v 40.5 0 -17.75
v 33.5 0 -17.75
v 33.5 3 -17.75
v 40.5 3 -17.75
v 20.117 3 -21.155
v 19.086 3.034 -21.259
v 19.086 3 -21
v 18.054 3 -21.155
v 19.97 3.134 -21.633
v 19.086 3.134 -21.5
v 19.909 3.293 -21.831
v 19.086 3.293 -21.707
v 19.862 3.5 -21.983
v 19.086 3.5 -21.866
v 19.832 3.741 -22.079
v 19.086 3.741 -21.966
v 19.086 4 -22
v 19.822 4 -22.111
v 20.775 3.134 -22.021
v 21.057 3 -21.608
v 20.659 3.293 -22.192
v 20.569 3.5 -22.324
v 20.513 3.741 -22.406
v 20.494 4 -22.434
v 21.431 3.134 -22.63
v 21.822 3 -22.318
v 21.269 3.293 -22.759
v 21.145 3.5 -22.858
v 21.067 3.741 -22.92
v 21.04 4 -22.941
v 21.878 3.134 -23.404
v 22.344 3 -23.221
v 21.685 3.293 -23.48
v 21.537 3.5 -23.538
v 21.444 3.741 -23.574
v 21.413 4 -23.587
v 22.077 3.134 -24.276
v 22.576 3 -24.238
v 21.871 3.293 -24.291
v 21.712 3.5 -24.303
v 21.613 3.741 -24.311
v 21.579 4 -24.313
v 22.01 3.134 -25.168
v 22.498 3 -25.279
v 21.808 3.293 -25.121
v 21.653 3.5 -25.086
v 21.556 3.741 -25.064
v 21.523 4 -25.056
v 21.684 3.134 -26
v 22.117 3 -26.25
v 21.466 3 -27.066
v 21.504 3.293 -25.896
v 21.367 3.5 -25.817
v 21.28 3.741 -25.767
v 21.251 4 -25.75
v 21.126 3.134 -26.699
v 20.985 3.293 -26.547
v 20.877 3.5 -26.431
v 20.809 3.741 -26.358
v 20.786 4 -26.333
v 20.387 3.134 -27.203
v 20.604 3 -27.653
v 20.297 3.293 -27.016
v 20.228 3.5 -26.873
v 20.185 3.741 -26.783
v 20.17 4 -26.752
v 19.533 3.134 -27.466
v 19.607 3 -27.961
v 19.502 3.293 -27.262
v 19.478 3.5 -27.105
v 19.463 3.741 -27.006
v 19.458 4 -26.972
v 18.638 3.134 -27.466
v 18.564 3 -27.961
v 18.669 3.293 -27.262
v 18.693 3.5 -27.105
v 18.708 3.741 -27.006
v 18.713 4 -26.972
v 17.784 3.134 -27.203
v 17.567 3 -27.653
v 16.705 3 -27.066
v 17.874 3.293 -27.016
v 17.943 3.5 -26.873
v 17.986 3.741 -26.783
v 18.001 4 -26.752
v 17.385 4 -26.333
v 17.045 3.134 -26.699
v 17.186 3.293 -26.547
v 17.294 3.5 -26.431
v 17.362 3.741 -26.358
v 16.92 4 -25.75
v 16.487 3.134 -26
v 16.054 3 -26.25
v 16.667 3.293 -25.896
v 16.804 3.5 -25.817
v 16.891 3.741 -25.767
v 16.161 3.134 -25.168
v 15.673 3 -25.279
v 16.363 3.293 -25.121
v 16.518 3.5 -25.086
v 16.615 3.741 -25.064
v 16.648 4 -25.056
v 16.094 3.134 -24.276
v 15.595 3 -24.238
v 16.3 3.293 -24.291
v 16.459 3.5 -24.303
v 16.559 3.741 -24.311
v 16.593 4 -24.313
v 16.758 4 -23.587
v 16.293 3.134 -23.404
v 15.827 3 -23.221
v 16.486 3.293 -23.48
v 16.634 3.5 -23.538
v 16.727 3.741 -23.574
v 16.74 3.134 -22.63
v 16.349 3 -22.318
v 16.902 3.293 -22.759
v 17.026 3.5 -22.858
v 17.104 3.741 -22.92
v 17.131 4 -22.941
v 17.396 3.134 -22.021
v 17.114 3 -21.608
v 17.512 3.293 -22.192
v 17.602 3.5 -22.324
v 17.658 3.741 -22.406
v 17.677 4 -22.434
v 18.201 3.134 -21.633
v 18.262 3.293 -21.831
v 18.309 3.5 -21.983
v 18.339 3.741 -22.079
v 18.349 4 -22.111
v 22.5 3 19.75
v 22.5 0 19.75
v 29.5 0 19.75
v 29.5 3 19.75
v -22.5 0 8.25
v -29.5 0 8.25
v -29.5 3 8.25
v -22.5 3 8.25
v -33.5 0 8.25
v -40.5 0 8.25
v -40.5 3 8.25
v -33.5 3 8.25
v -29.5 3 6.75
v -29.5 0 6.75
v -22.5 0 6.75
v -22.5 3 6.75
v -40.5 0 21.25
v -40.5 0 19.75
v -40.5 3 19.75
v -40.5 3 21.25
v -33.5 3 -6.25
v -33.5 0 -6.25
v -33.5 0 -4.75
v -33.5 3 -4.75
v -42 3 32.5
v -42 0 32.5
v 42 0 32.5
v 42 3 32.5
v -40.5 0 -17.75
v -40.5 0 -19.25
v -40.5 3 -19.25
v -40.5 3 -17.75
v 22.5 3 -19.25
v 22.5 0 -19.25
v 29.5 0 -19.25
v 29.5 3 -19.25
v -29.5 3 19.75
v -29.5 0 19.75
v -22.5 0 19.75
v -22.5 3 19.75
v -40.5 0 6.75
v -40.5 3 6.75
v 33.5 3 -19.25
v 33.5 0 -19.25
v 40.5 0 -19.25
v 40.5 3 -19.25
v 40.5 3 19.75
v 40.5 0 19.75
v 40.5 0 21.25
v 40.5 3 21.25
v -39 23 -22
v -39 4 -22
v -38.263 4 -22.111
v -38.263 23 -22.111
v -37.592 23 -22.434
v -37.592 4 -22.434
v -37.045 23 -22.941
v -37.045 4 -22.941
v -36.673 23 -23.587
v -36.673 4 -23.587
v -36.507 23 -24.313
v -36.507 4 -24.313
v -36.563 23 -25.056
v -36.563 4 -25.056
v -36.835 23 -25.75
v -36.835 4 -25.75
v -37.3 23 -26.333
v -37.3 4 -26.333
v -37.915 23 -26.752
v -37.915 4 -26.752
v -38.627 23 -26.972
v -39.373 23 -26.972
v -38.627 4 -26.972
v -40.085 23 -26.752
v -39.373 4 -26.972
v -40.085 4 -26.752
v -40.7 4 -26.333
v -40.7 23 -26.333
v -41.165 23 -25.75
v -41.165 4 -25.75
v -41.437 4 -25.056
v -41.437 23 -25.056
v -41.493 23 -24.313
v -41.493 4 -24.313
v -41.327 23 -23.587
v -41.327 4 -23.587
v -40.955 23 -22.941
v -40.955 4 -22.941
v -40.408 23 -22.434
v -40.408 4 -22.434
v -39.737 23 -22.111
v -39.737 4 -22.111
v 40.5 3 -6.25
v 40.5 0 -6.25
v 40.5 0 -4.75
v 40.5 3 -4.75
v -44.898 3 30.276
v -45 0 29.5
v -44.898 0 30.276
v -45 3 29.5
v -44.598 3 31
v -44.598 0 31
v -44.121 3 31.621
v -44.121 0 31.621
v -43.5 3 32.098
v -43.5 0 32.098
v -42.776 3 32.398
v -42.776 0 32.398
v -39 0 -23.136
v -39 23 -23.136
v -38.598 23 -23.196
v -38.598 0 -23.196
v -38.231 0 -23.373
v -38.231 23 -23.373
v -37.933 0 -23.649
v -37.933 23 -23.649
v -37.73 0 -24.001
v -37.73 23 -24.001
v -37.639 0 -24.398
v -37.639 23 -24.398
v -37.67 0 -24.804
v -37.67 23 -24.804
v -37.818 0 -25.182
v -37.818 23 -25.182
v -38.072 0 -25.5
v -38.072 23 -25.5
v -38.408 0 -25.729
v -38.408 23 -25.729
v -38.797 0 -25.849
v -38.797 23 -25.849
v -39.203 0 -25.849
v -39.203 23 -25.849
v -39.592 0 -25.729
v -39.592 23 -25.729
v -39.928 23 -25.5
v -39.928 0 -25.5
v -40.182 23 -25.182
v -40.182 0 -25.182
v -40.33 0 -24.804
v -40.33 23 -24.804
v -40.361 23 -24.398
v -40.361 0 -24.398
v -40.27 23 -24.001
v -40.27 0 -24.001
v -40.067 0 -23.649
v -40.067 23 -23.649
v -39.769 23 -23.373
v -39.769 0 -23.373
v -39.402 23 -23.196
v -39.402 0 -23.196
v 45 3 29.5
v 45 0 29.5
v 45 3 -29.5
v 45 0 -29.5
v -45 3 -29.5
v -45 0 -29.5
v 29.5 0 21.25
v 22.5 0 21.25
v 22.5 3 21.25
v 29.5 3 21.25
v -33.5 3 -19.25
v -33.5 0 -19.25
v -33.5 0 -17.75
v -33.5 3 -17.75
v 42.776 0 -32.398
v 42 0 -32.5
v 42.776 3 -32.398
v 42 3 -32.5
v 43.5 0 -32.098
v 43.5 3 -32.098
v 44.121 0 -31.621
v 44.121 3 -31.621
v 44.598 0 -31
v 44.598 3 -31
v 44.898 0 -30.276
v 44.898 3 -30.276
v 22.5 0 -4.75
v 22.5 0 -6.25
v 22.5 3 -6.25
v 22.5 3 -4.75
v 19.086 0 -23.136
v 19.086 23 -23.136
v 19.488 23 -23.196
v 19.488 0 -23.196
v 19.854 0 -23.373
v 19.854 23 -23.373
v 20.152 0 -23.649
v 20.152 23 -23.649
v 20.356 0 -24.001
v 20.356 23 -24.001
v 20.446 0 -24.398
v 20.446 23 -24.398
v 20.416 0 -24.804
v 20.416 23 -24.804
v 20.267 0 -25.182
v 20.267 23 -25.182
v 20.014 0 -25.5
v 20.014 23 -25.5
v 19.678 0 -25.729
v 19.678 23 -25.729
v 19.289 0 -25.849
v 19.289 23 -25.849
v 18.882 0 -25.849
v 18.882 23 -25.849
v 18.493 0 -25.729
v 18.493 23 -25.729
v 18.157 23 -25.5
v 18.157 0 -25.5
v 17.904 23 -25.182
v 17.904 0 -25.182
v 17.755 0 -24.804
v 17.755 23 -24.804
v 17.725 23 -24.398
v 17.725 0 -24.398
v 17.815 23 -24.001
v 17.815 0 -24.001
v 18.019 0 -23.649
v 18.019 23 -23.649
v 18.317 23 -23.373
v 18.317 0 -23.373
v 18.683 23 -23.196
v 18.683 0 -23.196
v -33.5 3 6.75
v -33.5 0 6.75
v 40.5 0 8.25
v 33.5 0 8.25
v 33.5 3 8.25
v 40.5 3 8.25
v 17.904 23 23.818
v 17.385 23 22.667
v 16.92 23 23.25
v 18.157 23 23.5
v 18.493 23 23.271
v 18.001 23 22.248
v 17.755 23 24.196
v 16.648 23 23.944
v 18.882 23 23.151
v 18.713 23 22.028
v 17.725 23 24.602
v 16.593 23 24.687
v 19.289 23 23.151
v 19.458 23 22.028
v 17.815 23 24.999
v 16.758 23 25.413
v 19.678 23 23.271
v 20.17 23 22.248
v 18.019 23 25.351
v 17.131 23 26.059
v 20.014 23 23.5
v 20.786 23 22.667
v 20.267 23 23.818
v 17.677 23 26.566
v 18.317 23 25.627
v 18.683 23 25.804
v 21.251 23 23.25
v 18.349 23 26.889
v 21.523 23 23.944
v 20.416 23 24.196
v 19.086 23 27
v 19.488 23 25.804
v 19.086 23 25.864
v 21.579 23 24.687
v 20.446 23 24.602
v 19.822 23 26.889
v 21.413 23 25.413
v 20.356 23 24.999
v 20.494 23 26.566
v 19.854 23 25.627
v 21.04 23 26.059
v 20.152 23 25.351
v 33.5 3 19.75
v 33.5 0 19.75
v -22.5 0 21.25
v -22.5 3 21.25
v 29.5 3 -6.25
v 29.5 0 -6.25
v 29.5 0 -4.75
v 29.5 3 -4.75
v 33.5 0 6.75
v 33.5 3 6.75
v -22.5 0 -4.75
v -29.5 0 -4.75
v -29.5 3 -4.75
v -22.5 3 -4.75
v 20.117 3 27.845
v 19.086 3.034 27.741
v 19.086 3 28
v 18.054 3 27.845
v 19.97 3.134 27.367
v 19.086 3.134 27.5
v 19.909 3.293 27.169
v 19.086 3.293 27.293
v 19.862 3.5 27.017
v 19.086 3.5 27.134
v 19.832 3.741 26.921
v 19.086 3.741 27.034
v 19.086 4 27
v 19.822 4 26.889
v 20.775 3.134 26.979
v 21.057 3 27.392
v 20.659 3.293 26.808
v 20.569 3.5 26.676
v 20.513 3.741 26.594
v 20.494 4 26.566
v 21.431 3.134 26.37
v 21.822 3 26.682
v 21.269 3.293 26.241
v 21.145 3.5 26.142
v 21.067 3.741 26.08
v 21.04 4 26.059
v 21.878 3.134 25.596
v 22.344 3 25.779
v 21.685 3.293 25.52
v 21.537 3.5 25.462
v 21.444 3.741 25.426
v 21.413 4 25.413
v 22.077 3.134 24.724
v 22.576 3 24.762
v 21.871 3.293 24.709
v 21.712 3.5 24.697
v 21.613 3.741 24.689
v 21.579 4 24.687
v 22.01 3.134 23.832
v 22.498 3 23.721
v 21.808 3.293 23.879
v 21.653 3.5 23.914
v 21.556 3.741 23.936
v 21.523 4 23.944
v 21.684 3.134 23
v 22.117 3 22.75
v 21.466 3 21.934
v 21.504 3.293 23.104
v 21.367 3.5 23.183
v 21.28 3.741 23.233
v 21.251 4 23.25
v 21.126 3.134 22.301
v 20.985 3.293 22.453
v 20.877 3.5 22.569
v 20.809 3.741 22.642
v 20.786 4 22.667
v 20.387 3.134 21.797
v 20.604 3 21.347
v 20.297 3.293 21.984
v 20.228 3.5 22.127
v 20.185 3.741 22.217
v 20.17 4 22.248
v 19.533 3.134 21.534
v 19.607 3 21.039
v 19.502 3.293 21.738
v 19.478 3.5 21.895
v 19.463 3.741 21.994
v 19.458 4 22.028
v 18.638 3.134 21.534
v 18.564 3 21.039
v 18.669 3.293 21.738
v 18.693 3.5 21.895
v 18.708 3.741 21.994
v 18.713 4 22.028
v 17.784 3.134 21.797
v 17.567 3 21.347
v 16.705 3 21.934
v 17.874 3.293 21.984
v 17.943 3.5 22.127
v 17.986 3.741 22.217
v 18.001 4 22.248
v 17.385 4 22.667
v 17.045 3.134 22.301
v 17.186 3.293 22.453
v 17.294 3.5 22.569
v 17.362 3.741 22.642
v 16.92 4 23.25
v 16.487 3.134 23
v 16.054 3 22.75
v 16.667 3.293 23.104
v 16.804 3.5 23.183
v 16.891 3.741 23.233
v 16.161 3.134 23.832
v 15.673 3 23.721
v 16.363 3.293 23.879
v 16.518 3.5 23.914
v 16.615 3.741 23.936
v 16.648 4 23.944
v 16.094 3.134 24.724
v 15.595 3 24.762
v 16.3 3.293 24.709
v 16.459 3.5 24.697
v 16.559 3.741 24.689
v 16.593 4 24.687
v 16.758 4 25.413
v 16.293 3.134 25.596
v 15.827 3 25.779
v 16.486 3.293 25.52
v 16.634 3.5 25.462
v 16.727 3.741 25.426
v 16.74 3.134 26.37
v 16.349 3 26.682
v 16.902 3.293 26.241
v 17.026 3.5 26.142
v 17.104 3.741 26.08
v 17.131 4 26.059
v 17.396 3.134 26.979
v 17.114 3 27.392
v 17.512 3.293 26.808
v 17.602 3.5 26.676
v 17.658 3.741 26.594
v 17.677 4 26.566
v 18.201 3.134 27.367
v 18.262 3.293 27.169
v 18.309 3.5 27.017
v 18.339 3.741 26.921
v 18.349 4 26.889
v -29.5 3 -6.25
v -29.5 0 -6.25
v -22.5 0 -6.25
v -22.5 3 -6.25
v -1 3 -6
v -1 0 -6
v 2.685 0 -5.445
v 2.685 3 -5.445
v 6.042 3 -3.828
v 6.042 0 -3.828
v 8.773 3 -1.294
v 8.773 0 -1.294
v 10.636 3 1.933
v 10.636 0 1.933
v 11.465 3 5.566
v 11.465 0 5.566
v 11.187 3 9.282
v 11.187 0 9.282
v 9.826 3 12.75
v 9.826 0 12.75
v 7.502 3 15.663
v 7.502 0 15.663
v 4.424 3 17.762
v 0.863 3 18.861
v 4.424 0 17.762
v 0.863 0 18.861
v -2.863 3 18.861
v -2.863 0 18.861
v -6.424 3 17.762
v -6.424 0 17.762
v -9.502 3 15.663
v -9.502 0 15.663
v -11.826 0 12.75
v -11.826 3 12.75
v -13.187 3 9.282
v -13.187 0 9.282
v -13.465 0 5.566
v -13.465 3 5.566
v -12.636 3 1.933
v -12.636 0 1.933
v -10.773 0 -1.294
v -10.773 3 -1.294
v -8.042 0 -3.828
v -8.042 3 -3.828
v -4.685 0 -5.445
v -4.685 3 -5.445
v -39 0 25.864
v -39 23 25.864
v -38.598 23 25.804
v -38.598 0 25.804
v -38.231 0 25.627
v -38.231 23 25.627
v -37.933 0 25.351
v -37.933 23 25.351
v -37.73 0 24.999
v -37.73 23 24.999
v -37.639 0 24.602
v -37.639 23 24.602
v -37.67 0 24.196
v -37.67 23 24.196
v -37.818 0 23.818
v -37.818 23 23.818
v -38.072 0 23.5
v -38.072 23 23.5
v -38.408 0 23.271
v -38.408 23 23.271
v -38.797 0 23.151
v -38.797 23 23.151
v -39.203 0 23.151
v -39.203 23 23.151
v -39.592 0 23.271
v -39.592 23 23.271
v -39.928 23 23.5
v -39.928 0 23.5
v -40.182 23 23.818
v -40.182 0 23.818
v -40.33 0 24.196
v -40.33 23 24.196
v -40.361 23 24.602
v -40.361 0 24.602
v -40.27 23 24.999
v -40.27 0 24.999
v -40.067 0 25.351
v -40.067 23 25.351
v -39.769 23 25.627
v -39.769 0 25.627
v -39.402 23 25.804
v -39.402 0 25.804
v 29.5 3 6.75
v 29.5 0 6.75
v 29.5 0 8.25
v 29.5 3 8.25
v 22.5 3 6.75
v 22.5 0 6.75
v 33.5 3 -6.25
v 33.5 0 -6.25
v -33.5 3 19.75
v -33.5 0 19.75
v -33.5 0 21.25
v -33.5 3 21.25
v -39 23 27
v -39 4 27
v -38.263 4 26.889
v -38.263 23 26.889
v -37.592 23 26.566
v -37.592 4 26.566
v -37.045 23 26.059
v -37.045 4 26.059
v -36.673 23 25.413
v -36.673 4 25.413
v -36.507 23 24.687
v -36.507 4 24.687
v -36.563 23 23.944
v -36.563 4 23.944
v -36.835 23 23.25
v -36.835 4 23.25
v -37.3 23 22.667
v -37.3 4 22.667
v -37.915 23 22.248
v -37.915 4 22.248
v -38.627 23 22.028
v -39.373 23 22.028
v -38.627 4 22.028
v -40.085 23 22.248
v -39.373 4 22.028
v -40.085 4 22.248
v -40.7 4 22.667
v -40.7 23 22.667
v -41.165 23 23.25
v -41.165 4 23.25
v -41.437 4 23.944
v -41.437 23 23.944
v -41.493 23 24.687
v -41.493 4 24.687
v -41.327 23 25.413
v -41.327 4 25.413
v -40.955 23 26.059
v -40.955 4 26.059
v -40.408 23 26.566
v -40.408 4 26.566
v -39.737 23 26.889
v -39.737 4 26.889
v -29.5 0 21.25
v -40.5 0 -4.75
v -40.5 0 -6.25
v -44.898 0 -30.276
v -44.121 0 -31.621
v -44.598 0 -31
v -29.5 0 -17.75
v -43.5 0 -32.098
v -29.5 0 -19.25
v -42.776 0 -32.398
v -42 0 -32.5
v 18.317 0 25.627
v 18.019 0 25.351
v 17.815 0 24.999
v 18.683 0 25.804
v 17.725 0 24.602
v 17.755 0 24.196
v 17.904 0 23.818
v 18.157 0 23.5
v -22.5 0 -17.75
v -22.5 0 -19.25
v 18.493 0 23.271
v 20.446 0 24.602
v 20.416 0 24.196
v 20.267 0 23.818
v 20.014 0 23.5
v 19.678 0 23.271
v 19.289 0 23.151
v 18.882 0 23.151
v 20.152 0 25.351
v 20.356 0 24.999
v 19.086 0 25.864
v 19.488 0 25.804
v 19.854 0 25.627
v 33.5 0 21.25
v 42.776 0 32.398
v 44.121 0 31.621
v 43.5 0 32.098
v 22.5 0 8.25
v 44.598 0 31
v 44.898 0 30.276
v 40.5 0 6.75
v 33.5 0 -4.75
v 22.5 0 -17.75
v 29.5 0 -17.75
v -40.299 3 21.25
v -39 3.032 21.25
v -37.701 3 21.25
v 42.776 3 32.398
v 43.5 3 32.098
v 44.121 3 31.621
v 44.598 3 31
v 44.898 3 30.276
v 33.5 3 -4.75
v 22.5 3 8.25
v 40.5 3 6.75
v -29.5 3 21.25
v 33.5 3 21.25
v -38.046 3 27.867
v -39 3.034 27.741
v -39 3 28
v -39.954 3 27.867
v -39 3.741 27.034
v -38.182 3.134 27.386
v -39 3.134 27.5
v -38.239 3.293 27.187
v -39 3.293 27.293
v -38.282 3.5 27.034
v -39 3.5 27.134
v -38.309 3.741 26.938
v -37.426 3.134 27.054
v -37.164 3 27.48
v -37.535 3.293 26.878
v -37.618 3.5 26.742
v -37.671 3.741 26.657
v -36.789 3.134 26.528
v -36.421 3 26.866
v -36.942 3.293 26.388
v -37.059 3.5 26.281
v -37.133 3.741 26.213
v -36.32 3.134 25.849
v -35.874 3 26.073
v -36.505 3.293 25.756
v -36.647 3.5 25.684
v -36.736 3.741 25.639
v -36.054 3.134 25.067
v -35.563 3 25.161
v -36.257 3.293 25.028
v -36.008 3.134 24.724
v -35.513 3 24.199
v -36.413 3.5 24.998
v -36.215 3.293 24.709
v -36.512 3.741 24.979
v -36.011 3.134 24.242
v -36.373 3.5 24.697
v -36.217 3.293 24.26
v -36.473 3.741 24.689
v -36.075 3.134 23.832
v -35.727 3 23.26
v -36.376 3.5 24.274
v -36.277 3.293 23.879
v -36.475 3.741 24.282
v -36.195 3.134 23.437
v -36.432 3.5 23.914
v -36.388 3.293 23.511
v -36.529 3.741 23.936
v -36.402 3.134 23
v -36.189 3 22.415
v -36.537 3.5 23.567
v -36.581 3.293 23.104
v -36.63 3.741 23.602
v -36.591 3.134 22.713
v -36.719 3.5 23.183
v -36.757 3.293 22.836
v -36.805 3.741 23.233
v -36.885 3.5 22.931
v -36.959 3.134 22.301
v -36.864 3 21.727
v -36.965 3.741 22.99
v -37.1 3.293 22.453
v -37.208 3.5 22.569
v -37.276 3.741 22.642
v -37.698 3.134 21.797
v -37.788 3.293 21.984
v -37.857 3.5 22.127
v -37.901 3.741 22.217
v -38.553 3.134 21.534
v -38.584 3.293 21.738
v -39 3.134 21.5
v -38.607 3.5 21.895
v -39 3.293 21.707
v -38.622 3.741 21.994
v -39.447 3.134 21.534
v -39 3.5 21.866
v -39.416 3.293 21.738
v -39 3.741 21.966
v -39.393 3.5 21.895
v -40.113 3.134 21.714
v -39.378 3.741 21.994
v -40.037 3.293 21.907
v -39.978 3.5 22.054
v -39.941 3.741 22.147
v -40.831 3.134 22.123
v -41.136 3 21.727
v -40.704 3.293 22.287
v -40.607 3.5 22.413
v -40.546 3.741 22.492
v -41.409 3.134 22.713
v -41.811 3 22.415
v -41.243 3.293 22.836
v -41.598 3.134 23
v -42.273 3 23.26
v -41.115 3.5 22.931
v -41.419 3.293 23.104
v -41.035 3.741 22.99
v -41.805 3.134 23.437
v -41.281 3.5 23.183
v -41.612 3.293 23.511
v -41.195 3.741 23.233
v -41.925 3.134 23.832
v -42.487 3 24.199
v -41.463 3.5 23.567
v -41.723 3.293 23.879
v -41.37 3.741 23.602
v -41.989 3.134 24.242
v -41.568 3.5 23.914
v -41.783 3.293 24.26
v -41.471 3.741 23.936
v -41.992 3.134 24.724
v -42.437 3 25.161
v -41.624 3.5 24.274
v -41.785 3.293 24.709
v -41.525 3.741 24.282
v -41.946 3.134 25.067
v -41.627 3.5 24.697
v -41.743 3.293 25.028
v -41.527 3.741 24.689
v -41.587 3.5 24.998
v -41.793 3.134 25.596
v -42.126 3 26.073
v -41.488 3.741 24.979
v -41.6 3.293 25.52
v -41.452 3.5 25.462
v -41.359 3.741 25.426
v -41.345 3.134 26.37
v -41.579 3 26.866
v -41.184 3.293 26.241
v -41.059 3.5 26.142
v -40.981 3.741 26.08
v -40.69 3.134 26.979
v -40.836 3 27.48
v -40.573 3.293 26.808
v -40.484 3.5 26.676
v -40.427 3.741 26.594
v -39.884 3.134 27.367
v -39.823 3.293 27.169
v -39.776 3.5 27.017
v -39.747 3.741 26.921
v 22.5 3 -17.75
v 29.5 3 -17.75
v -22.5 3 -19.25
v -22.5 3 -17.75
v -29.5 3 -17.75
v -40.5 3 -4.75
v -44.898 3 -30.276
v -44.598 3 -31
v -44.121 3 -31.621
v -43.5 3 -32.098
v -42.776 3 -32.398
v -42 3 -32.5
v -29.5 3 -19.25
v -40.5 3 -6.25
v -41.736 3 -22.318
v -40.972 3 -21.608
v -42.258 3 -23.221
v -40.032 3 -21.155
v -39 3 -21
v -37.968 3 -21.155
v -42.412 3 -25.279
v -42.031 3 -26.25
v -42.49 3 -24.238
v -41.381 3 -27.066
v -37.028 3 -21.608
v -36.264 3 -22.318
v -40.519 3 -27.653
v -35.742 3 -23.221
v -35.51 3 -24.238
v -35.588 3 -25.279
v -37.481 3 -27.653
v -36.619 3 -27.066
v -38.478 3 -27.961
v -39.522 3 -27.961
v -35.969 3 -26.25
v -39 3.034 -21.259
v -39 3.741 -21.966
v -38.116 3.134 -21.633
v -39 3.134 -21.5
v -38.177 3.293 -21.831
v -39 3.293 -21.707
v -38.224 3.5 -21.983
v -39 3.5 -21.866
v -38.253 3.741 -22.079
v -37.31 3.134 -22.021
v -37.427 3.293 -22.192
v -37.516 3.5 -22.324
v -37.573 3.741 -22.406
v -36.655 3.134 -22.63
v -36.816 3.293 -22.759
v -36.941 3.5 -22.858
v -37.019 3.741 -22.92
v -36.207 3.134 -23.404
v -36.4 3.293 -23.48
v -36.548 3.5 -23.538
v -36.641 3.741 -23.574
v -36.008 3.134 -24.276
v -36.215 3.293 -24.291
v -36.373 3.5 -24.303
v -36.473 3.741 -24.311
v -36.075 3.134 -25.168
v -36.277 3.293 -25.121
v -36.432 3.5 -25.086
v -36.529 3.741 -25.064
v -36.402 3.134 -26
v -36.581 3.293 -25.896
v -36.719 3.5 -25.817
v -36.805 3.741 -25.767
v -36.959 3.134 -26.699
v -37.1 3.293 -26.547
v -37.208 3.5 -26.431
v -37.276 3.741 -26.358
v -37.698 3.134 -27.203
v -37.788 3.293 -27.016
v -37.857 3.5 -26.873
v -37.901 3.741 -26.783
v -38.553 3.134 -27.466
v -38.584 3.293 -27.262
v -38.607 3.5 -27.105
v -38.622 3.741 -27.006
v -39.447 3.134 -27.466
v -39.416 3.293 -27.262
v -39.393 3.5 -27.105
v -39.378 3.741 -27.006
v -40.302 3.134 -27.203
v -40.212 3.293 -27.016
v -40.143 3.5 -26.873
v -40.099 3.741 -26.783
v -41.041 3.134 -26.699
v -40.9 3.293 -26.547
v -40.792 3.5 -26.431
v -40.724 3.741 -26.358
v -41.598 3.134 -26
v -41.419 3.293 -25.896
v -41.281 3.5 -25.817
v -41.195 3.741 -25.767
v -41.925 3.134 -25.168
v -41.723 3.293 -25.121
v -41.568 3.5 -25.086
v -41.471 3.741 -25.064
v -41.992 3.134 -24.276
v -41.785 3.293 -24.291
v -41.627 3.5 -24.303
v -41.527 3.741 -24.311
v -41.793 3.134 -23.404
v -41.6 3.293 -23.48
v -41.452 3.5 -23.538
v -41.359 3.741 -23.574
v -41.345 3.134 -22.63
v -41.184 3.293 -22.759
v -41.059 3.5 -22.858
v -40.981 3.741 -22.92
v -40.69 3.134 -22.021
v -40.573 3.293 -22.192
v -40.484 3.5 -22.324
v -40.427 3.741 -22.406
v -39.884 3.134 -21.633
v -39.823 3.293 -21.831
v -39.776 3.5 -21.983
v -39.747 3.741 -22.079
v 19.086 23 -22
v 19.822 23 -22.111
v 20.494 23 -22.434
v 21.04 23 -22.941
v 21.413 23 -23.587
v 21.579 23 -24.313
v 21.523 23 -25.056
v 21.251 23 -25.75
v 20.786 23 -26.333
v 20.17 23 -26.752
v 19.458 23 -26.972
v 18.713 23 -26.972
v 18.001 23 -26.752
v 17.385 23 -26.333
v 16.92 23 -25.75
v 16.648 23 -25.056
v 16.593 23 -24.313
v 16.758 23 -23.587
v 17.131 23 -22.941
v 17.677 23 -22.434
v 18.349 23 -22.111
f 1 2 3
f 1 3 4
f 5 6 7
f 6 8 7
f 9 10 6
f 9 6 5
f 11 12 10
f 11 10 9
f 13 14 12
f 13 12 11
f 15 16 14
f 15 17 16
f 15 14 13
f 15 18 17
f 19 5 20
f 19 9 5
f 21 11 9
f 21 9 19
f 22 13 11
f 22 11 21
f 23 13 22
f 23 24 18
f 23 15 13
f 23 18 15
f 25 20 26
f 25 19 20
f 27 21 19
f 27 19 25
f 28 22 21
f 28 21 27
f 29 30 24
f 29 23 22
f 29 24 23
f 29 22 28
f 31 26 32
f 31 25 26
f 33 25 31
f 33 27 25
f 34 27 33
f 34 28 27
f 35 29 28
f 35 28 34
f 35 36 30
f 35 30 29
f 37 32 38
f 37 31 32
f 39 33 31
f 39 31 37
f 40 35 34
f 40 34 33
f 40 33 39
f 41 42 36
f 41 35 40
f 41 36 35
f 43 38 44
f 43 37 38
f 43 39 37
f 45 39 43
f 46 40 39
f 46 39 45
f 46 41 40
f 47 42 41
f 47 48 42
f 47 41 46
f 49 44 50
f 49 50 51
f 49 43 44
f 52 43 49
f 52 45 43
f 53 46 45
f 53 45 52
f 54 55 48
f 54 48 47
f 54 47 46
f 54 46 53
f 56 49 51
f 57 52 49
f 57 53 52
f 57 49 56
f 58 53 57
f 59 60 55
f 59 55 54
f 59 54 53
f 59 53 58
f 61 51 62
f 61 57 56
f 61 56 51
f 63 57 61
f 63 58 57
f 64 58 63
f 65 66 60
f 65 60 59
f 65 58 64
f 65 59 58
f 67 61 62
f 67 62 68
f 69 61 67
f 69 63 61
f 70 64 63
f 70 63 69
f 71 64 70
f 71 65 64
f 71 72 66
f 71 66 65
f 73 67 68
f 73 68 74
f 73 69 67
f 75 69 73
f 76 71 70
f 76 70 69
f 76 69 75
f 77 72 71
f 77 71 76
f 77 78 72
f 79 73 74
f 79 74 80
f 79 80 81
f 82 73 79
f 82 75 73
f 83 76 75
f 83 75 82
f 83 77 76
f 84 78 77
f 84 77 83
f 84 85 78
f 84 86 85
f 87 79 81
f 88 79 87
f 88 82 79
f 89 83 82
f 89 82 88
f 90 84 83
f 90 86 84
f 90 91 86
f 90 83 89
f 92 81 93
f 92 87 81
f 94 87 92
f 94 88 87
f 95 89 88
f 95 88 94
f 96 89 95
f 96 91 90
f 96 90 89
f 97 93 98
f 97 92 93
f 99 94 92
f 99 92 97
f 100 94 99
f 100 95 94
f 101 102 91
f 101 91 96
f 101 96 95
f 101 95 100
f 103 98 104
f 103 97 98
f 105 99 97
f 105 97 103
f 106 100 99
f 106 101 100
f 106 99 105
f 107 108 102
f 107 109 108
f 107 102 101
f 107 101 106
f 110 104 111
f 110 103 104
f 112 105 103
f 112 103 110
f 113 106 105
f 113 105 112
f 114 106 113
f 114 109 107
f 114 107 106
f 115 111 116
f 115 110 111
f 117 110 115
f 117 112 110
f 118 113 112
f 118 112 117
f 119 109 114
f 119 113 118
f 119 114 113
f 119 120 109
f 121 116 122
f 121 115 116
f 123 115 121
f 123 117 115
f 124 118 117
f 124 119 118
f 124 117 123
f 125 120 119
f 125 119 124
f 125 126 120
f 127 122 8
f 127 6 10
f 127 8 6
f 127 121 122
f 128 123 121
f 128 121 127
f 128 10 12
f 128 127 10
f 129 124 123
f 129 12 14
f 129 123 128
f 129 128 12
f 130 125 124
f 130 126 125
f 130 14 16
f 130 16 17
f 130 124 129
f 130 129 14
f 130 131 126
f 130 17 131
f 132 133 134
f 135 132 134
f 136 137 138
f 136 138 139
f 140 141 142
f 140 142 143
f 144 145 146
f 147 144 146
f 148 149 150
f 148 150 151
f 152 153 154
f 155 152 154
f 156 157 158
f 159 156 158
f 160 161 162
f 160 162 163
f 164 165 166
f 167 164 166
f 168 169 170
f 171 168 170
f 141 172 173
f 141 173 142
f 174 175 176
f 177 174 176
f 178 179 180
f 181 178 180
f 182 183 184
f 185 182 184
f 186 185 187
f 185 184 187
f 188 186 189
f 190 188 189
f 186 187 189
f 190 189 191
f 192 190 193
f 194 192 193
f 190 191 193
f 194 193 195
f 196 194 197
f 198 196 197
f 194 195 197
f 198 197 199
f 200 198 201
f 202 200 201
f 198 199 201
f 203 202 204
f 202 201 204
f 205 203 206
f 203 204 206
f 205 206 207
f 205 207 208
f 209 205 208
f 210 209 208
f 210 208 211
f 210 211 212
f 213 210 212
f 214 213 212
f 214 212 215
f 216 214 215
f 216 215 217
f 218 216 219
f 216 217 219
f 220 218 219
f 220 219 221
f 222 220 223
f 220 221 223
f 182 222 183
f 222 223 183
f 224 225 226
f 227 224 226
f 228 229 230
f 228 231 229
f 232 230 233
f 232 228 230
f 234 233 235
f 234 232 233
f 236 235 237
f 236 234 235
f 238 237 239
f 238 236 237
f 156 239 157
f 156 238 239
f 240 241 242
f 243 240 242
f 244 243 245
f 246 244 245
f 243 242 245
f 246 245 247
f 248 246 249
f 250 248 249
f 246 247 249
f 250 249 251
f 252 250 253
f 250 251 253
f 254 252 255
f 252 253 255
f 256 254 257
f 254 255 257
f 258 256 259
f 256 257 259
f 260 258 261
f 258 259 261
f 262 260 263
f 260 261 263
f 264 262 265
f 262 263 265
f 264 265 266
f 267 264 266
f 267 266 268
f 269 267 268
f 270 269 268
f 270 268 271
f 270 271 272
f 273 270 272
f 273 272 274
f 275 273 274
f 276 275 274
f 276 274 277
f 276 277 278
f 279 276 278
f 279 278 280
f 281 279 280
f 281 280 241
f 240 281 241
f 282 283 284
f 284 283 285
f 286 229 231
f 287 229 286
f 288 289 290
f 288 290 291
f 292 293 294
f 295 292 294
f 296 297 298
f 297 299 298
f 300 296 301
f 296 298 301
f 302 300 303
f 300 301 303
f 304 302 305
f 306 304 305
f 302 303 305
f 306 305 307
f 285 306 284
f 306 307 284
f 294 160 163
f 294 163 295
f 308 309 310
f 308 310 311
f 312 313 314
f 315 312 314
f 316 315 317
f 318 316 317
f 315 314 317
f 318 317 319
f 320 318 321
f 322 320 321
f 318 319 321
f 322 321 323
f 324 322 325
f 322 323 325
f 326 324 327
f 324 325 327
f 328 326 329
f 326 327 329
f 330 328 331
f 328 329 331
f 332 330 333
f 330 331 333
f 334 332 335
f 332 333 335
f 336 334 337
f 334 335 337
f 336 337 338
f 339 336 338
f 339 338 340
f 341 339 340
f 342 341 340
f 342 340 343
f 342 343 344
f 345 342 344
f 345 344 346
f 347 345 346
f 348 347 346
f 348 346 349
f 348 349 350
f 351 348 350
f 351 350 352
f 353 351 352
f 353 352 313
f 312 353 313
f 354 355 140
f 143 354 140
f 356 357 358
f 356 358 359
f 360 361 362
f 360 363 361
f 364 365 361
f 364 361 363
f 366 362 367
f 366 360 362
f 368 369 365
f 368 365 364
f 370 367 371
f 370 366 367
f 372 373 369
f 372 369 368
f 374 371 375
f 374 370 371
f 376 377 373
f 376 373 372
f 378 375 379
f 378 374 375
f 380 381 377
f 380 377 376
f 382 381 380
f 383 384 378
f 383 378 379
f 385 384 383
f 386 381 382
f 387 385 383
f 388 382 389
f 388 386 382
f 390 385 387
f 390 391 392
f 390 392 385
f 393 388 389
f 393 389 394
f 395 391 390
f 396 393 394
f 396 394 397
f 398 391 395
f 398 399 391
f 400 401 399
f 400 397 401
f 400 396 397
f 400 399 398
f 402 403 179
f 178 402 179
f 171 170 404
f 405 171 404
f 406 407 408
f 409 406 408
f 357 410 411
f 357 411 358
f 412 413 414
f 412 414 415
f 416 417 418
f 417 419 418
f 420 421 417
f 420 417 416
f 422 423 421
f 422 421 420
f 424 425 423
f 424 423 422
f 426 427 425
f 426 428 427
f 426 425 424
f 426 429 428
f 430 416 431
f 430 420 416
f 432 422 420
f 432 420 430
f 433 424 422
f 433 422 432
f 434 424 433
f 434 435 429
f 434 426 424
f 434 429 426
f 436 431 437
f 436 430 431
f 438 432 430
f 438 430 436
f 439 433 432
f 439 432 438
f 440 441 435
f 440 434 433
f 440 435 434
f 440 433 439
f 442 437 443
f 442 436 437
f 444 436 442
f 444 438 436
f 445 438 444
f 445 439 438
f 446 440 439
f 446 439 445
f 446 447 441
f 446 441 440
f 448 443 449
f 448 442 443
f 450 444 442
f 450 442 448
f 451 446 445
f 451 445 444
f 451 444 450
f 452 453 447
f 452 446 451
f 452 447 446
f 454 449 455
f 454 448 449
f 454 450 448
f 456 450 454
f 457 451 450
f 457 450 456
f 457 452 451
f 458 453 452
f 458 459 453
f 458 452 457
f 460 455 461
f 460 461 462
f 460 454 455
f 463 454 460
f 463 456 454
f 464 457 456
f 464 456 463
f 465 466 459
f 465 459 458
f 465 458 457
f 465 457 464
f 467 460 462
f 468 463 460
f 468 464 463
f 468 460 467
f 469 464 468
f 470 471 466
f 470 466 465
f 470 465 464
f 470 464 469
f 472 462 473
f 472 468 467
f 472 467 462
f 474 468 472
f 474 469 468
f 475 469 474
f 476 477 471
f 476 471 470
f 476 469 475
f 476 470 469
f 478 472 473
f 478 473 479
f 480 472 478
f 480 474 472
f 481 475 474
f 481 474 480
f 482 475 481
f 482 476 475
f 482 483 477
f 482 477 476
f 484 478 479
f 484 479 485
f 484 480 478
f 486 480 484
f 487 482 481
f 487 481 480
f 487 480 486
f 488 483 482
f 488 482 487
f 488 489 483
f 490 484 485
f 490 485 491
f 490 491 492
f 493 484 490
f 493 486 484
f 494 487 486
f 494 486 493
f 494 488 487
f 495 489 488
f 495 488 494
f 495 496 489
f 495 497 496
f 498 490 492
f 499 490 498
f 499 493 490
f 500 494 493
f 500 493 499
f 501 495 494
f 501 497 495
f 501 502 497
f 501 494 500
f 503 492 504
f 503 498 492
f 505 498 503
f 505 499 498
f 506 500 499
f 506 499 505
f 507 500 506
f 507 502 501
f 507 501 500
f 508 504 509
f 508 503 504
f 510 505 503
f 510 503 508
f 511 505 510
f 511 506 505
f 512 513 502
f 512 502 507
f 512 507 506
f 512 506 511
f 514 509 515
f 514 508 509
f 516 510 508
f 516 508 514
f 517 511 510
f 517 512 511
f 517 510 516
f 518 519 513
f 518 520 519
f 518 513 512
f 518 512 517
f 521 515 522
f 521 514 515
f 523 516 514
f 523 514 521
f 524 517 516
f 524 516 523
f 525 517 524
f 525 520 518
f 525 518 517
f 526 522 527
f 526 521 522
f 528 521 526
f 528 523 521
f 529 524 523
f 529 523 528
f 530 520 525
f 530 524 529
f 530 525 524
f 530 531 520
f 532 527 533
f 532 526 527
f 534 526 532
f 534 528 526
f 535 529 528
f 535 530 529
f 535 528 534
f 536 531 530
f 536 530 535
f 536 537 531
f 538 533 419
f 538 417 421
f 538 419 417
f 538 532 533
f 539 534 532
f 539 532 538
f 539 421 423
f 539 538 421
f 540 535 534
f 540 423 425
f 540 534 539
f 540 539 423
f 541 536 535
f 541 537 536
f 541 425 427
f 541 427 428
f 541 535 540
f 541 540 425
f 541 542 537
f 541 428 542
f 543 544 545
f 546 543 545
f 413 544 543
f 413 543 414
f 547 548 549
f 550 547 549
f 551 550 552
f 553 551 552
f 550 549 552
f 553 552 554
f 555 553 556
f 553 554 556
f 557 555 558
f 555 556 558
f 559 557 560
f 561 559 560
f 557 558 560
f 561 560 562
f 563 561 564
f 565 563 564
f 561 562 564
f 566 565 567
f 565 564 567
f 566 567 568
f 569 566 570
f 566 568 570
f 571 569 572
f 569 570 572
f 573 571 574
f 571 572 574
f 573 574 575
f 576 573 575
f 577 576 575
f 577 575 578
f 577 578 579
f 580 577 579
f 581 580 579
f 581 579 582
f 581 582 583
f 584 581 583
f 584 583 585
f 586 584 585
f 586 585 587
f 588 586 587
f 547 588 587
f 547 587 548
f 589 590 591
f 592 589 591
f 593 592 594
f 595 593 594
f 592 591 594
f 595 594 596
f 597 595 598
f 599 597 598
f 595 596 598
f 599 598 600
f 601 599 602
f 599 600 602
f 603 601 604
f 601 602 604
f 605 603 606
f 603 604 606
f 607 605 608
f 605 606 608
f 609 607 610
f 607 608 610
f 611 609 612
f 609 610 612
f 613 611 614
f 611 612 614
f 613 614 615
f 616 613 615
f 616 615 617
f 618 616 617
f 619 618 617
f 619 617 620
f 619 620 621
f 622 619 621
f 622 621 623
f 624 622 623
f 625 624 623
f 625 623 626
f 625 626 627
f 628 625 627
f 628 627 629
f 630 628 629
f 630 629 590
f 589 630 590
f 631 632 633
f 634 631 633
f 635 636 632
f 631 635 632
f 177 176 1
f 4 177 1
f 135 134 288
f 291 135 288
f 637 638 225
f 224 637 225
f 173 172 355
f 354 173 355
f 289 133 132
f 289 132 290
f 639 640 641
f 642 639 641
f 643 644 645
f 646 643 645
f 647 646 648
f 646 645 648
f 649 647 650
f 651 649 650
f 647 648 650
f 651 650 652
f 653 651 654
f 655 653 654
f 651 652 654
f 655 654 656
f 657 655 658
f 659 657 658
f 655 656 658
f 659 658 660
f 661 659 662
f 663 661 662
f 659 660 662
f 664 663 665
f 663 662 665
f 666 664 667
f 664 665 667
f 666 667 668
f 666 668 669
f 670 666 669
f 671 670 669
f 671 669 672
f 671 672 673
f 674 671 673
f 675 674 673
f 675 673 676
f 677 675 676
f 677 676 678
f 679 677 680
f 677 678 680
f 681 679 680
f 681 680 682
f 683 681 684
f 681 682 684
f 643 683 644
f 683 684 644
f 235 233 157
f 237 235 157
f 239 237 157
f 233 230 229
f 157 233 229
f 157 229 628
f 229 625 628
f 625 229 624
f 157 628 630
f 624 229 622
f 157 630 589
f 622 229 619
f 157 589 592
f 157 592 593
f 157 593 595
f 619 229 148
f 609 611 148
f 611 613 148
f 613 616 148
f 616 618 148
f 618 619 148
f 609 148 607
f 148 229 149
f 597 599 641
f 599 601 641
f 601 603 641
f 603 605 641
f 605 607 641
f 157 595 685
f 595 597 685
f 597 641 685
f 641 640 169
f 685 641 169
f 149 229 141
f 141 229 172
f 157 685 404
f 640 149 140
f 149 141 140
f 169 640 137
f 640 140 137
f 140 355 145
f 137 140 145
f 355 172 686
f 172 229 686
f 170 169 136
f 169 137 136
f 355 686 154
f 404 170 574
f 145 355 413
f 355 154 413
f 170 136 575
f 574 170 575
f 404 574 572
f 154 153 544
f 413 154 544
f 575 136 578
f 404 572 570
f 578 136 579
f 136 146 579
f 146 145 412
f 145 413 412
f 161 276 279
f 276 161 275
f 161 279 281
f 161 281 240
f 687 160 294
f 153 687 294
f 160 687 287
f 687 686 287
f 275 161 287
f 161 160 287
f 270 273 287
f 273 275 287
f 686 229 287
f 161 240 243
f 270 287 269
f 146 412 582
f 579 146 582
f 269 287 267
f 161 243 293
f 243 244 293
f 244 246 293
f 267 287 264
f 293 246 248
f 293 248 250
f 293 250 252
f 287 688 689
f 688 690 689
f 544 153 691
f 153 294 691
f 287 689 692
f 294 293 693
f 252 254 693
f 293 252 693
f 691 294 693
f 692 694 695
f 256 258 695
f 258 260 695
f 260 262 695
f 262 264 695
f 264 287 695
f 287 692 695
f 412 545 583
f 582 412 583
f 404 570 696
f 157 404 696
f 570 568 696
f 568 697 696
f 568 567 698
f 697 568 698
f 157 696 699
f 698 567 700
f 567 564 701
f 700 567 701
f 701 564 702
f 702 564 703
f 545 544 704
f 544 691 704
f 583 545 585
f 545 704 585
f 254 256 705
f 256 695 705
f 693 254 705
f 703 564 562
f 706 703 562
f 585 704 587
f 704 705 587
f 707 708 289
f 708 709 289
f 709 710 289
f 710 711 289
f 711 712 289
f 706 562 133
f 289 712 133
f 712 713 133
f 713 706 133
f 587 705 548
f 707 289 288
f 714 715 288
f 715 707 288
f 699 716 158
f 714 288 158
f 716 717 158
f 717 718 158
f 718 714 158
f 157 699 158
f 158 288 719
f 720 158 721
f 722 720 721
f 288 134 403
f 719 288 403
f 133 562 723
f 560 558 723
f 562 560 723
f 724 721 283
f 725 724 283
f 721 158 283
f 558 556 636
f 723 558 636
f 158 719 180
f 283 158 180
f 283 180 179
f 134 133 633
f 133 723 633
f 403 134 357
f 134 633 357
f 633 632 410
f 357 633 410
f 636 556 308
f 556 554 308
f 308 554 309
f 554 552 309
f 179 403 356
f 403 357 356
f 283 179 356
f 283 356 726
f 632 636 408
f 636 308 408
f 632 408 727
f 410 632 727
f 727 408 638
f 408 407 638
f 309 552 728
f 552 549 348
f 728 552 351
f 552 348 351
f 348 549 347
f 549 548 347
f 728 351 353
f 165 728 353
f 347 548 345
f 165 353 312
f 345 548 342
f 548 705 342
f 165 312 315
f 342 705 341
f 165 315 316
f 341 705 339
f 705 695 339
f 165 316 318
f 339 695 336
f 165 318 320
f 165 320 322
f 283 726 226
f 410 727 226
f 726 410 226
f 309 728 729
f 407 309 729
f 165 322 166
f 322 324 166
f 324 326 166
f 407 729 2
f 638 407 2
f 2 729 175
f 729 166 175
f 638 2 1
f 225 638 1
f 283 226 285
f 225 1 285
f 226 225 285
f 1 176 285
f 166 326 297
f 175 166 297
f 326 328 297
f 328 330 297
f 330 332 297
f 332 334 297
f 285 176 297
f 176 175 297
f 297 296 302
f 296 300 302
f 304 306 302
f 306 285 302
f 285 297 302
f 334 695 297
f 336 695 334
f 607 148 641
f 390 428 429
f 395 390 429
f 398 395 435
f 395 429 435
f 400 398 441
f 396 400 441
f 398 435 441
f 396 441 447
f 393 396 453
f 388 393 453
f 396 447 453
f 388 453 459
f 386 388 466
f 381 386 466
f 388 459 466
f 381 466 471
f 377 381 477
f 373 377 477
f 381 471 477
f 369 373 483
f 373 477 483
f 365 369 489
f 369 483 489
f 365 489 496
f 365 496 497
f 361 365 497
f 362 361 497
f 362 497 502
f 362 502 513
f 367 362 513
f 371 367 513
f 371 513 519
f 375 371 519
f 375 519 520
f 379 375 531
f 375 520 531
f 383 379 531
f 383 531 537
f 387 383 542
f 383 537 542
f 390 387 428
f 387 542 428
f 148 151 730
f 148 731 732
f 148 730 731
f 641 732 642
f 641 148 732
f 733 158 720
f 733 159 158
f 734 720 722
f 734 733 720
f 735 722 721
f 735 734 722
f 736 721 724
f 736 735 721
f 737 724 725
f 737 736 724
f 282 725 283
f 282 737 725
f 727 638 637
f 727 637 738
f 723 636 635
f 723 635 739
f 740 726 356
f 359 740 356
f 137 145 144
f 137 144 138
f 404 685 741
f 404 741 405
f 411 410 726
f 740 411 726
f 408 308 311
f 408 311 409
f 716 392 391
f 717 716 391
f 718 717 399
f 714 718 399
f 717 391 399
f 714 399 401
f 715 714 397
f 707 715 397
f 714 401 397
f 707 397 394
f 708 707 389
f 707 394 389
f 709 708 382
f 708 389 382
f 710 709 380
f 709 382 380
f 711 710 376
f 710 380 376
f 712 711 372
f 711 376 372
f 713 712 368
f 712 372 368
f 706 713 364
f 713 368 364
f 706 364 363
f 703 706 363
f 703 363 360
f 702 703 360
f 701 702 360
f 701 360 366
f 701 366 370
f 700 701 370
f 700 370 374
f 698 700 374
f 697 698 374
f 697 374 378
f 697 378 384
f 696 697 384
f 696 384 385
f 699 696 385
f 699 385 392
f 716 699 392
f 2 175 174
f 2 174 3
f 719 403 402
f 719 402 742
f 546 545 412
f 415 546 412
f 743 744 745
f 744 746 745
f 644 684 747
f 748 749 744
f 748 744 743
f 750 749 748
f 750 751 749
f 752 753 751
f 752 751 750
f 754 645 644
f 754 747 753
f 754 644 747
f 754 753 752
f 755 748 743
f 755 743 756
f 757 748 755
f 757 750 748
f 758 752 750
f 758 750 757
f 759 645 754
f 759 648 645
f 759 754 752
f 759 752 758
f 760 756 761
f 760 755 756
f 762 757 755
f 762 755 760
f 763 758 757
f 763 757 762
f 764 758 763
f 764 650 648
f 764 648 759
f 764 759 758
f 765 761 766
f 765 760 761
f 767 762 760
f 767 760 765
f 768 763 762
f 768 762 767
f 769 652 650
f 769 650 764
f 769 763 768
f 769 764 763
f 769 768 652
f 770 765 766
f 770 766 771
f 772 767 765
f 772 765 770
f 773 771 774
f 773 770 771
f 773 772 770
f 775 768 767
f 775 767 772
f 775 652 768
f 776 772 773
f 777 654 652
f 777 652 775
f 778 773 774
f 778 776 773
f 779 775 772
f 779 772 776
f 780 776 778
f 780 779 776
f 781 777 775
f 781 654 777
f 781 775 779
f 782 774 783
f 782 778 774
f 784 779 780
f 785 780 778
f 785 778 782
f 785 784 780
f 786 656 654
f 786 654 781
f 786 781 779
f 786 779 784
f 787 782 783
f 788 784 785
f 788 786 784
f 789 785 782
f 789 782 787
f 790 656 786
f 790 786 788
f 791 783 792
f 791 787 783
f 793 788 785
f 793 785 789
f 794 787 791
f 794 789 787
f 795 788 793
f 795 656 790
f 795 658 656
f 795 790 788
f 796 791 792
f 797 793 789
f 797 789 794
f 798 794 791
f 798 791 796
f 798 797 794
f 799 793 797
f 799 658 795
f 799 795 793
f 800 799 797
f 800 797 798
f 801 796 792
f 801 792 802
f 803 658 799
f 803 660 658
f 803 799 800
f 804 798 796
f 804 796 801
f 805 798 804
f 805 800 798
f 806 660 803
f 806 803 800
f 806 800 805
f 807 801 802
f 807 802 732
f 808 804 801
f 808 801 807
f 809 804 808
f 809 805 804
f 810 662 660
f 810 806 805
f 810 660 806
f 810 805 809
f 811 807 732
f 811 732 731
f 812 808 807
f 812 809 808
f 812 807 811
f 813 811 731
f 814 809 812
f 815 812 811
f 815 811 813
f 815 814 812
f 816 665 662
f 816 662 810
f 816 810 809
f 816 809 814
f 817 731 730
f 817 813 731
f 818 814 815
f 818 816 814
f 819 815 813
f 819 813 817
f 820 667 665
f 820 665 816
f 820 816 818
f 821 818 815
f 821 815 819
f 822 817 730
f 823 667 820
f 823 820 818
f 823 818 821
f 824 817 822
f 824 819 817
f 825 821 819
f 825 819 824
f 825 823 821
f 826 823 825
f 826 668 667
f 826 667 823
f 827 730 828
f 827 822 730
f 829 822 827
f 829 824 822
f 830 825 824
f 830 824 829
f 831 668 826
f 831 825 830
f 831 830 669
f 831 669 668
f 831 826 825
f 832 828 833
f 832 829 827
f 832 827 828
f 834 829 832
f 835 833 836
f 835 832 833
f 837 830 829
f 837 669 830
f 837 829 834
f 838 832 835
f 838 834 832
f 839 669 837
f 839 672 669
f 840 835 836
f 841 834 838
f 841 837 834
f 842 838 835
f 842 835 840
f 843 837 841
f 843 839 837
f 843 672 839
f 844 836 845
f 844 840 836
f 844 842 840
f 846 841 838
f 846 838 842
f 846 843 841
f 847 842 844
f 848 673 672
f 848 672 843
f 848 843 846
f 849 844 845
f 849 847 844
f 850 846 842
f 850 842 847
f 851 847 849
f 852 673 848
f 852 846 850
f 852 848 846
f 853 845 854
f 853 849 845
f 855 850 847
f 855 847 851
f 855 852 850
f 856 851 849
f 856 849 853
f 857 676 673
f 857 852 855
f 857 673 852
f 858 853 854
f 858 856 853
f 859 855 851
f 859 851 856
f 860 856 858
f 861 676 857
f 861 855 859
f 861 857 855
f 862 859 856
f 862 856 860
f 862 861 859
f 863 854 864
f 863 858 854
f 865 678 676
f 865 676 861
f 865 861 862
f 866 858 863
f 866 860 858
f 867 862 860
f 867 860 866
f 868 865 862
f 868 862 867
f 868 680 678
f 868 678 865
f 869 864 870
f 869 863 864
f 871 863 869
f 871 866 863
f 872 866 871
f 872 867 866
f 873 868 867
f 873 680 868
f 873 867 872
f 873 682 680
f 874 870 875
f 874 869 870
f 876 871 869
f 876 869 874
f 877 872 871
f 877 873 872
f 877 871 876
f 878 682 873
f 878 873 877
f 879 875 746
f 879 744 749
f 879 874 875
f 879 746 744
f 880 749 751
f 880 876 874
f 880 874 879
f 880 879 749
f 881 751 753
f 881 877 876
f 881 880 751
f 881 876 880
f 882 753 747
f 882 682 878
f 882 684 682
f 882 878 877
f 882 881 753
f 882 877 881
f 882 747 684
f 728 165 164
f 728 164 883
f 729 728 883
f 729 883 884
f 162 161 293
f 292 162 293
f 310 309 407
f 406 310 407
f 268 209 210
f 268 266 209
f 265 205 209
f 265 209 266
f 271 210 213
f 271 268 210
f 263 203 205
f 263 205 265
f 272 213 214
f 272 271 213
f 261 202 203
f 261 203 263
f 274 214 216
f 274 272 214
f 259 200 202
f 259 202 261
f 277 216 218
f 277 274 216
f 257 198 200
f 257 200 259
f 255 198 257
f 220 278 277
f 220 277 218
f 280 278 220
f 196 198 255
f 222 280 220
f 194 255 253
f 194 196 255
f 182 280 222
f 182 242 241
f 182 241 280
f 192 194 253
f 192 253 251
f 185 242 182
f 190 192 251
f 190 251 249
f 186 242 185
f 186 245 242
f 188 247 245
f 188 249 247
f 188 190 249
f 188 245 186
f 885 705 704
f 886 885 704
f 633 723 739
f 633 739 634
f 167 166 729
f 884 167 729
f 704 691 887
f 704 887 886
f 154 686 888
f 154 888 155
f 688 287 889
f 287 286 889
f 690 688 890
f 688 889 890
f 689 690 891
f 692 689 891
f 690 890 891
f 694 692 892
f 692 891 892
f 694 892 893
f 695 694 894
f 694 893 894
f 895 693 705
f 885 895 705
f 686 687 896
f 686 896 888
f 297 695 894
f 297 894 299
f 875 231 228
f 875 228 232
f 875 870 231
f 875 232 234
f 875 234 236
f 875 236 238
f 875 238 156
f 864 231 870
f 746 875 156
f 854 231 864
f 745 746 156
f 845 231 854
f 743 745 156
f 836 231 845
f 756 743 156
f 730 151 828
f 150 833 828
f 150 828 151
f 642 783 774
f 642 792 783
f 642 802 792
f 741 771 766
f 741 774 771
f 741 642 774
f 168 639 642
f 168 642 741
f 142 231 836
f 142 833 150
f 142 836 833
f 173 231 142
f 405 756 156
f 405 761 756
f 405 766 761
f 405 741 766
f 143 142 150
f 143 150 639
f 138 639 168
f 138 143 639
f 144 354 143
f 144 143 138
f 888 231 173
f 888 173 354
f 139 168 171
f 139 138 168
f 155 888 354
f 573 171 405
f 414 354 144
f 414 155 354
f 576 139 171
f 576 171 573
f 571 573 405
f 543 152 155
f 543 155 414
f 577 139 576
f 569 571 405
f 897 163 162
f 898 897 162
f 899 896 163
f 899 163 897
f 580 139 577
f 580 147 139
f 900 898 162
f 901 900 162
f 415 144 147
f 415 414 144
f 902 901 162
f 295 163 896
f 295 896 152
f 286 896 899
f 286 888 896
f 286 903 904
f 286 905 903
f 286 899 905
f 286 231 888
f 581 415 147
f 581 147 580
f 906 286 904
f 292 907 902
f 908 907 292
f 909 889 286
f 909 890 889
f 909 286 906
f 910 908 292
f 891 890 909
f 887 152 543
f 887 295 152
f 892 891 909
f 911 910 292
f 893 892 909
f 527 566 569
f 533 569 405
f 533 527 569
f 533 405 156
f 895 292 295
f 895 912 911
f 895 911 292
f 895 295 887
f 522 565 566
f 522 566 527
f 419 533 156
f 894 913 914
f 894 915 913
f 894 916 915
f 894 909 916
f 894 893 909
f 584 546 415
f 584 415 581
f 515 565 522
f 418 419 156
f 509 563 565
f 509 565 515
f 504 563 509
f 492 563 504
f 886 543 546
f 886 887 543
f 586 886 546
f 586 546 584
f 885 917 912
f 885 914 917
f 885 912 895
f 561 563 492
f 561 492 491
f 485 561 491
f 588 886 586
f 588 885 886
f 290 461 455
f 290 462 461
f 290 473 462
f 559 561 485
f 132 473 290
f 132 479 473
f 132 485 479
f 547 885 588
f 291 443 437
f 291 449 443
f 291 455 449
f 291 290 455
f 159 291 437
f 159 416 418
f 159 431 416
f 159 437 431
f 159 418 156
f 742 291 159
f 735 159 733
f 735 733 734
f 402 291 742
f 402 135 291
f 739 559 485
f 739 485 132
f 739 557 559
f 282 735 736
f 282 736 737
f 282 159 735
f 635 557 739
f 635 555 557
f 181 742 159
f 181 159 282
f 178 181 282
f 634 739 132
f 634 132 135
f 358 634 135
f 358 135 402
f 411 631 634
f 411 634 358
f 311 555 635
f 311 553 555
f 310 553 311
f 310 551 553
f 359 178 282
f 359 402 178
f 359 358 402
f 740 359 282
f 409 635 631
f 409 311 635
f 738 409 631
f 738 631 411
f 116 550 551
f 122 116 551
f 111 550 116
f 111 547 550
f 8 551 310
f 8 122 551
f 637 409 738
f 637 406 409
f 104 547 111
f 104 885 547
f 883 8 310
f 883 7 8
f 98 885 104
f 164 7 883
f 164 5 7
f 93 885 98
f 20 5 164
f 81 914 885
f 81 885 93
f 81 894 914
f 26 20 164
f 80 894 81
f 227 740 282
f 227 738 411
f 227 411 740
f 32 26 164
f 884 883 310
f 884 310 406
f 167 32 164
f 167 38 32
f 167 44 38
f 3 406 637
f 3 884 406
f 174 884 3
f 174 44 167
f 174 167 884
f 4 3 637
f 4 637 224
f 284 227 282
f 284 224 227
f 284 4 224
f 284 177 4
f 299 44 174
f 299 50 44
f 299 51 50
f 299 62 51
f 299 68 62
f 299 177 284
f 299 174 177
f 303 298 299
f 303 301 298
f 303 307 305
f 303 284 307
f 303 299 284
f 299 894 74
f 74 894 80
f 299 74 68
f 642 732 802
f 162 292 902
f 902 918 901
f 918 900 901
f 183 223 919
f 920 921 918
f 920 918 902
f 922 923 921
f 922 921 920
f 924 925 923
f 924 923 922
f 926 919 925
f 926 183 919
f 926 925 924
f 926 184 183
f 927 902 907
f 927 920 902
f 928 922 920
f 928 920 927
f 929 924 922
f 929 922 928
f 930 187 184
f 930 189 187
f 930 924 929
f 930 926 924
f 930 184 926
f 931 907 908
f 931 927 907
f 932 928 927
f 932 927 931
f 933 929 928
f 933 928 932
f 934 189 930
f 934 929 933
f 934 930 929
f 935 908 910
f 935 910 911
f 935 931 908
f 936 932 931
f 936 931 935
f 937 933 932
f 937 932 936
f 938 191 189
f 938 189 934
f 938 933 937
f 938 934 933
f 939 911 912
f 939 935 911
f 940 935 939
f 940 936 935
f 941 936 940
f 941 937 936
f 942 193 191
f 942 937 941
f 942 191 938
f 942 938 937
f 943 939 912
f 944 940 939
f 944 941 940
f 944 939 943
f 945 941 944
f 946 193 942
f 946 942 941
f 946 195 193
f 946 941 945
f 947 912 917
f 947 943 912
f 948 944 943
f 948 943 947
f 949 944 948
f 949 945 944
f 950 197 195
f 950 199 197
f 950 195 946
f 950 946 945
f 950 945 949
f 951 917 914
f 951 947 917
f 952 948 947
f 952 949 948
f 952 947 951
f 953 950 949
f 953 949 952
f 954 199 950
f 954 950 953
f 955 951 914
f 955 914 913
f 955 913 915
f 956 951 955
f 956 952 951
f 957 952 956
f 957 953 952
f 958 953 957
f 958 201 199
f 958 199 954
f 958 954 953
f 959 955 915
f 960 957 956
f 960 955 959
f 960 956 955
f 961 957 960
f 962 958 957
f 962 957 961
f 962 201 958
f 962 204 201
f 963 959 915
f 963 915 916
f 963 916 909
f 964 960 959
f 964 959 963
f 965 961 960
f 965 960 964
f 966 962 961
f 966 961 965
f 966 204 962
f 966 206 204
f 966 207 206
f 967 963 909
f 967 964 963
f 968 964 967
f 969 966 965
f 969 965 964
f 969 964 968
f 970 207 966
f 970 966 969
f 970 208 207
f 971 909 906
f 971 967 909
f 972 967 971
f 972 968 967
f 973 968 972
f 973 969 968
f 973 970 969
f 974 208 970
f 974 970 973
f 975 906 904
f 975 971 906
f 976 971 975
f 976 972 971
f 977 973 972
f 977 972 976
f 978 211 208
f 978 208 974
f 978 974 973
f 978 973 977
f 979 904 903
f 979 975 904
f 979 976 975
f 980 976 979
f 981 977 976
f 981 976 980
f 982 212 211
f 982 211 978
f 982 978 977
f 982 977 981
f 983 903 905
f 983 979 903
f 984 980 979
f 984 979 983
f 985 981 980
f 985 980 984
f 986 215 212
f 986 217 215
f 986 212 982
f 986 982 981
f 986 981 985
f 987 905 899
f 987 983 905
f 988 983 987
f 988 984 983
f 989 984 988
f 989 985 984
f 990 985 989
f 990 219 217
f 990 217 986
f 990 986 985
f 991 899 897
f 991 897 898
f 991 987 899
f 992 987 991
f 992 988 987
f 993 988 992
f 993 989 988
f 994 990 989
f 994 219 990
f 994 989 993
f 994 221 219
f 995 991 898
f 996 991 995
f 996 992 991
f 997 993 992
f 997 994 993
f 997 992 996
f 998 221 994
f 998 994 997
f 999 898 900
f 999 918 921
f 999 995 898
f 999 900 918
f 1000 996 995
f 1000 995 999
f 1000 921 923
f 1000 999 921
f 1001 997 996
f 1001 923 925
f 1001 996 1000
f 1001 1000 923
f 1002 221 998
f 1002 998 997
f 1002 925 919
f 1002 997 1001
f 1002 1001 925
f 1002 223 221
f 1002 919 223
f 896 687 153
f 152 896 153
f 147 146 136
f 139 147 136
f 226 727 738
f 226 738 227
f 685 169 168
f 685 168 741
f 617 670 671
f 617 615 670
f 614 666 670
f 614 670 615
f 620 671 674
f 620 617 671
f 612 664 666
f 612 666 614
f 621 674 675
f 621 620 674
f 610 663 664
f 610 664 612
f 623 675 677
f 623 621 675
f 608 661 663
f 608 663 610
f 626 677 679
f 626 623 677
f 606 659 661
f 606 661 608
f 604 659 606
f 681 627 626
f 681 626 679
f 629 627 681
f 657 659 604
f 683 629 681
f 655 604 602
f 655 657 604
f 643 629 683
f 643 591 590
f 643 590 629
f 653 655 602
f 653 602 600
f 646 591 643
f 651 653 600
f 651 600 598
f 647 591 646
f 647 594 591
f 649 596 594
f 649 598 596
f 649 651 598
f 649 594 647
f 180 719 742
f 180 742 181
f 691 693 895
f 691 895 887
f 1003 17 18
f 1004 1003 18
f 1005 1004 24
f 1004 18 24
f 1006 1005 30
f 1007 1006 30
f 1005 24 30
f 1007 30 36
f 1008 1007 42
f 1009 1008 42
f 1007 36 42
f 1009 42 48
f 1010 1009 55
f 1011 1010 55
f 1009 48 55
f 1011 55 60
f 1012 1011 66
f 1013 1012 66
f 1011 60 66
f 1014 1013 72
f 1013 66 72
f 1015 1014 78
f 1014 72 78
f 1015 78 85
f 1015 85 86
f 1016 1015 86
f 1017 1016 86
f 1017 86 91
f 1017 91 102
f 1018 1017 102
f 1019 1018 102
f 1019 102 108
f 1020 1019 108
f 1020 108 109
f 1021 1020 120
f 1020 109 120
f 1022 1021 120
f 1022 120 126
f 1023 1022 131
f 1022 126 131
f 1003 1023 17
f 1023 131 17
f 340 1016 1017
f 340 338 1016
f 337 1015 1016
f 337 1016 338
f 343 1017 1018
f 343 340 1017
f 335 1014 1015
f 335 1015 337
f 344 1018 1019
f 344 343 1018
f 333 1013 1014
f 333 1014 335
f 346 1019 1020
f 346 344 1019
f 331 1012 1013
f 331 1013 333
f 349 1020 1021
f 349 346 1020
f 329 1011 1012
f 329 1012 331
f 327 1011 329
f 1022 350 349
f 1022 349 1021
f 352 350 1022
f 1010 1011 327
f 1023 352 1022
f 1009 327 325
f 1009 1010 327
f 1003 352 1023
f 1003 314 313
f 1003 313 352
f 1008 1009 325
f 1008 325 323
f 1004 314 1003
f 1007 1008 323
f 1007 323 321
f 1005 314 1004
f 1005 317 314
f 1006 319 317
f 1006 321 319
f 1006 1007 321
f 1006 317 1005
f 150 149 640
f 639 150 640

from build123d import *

# Parameters (mm, degrees)
SKIZZE1_W                       = 90
SKIZZE1_H                       = 65
AUFSATZ_LINEAR_AUSTRAGEN1_DEPTH = 3
SKIZZE3_R                       = 2.5
AUFSATZ_LINEAR_AUSTRAGEN2_DEPTH = 20
SKIZZE4_R                       = 1.364499713
SCHNITT_LINEAR_AUSTRAGEN2_DEPTH = 61.085355953
VERRUNDUNG1_R                   = 3
VERRUNDUNG2_R                   = 1
SKIZZE5_R                       = 12.500347999
SCHNITT_LINEAR_AUSTRAGEN3_DEPTH = 61.085355953
SKIZZE6_W                       = 7
SKIZZE6_H                       = 1.5
SCHNITT_LINEAR_AUSTRAGEN4_DEPTH = 61.085355953
LINEARES_MUSTER1_COUNT          = 4
LINEARES_MUSTER1_PITCH          = 13


with BuildPart() as part:
    # Skizze1 → Aufsatz-Linear austragen1 (new body)
    with BuildSketch(Plane(origin=(0, 0, 0), x_dir=(1, 0, 0), z_dir=(0, 1, 0))):
        Rectangle(SKIZZE1_W, SKIZZE1_H)
    extrude(amount=AUFSATZ_LINEAR_AUSTRAGEN1_DEPTH)

    # Skizze3 → Aufsatz-Linear austragen2 (add)
    with BuildSketch(Plane(origin=(0, 3, 0), x_dir=(1, 0, 0), z_dir=(0, 1, 0))):
        with Locations(Location((-39, 24.5, 0), (0, 0, 270))):
            Circle(SKIZZE3_R)
        with Locations(Location((19.085512482, 24.5, 0), (0, 0, 270))):
            Circle(SKIZZE3_R)
        with Locations(Location((19.085512482, -24.5, 0), (0, 0, 270))):
            Circle(SKIZZE3_R)
        with Locations(Location((-39, -24.5, 0), (0, 0, 270))):
            Circle(SKIZZE3_R)
    extrude(amount=AUFSATZ_LINEAR_AUSTRAGEN2_DEPTH)

    # Skizze4 → Schnitt-Linear austragen2 (cut, through all)
    with BuildSketch(Plane(origin=(0, 23, 0), x_dir=(1, 0, 0), z_dir=(0, 1, 0))):
        with Locations(Location((19.085512482, 24.5, 0), (0, 0, 270))):
            Circle(SKIZZE4_R)
        with Locations(Location((-39, 24.5, 0), (0, 0, 270))):
            Circle(SKIZZE4_R)
        with Locations(Location((-39, -24.5, 0), (0, 0, 270))):
            Circle(SKIZZE4_R)
        with Locations(Location((19.085512482, -24.5, 0), (0, 0, 270))):
            Circle(SKIZZE4_R)
    extrude(amount=-SCHNITT_LINEAR_AUSTRAGEN2_DEPTH, mode=Mode.SUBTRACT)

    # Verrundung1
    verrundung1_edges = [part.edges().sort_by_distance(p)[0] for p in [
        (-45, 1.5, 32.5),
        (-45, 1.5, -32.5),
        (45, 1.5, -32.5),
        (45, 1.5, 32.5),
    ]]
    fillet(verrundung1_edges, radius=VERRUNDUNG1_R)

    # Verrundung2
    verrundung2_edges = [part.edges().sort_by_distance(p)[0] for p in [
        (-39, 3, -27),
        (19.085512482, 3, -27),
        (19.085512482, 3, 22),
        (-39, 3, 22),
    ]]
    fillet(verrundung2_edges, radius=VERRUNDUNG2_R)

    # Skizze5 → Schnitt-Linear austragen3 (cut, through all)
    with BuildSketch(Plane.XZ):
        with Locations(Location((-1, 6.5, 0), (0, 0, 270))):
            Circle(SKIZZE5_R)
    extrude(amount=-SCHNITT_LINEAR_AUSTRAGEN3_DEPTH, mode=Mode.SUBTRACT)

    # Skizze6 → Schnitt-Linear austragen4 (cut, through all)
    with BuildSketch(Plane.XZ):
        with Locations((-37, 20.5)):
            Rectangle(SKIZZE6_W, SKIZZE6_H)
        with Locations((-26, 20.5)):
            Rectangle(SKIZZE6_W, SKIZZE6_H)
        with Locations((26, 20.5)):
            Rectangle(SKIZZE6_W, SKIZZE6_H)
        with Locations((37, 20.5)):
            Rectangle(SKIZZE6_W, SKIZZE6_H)
    schnitt_linear_austragen4 = extrude(amount=-SCHNITT_LINEAR_AUSTRAGEN4_DEPTH, mode=Mode.SUBTRACT)

    # Lineares Muster1: Schnitt-Linear austragen4 ×4
    with Locations(*[(0, 0, -i * LINEARES_MUSTER1_PITCH) for i in range(1, LINEARES_MUSTER1_COUNT)]):
        add(schnitt_linear_austragen4, mode=Mode.SUBTRACT)


solid = part.part
